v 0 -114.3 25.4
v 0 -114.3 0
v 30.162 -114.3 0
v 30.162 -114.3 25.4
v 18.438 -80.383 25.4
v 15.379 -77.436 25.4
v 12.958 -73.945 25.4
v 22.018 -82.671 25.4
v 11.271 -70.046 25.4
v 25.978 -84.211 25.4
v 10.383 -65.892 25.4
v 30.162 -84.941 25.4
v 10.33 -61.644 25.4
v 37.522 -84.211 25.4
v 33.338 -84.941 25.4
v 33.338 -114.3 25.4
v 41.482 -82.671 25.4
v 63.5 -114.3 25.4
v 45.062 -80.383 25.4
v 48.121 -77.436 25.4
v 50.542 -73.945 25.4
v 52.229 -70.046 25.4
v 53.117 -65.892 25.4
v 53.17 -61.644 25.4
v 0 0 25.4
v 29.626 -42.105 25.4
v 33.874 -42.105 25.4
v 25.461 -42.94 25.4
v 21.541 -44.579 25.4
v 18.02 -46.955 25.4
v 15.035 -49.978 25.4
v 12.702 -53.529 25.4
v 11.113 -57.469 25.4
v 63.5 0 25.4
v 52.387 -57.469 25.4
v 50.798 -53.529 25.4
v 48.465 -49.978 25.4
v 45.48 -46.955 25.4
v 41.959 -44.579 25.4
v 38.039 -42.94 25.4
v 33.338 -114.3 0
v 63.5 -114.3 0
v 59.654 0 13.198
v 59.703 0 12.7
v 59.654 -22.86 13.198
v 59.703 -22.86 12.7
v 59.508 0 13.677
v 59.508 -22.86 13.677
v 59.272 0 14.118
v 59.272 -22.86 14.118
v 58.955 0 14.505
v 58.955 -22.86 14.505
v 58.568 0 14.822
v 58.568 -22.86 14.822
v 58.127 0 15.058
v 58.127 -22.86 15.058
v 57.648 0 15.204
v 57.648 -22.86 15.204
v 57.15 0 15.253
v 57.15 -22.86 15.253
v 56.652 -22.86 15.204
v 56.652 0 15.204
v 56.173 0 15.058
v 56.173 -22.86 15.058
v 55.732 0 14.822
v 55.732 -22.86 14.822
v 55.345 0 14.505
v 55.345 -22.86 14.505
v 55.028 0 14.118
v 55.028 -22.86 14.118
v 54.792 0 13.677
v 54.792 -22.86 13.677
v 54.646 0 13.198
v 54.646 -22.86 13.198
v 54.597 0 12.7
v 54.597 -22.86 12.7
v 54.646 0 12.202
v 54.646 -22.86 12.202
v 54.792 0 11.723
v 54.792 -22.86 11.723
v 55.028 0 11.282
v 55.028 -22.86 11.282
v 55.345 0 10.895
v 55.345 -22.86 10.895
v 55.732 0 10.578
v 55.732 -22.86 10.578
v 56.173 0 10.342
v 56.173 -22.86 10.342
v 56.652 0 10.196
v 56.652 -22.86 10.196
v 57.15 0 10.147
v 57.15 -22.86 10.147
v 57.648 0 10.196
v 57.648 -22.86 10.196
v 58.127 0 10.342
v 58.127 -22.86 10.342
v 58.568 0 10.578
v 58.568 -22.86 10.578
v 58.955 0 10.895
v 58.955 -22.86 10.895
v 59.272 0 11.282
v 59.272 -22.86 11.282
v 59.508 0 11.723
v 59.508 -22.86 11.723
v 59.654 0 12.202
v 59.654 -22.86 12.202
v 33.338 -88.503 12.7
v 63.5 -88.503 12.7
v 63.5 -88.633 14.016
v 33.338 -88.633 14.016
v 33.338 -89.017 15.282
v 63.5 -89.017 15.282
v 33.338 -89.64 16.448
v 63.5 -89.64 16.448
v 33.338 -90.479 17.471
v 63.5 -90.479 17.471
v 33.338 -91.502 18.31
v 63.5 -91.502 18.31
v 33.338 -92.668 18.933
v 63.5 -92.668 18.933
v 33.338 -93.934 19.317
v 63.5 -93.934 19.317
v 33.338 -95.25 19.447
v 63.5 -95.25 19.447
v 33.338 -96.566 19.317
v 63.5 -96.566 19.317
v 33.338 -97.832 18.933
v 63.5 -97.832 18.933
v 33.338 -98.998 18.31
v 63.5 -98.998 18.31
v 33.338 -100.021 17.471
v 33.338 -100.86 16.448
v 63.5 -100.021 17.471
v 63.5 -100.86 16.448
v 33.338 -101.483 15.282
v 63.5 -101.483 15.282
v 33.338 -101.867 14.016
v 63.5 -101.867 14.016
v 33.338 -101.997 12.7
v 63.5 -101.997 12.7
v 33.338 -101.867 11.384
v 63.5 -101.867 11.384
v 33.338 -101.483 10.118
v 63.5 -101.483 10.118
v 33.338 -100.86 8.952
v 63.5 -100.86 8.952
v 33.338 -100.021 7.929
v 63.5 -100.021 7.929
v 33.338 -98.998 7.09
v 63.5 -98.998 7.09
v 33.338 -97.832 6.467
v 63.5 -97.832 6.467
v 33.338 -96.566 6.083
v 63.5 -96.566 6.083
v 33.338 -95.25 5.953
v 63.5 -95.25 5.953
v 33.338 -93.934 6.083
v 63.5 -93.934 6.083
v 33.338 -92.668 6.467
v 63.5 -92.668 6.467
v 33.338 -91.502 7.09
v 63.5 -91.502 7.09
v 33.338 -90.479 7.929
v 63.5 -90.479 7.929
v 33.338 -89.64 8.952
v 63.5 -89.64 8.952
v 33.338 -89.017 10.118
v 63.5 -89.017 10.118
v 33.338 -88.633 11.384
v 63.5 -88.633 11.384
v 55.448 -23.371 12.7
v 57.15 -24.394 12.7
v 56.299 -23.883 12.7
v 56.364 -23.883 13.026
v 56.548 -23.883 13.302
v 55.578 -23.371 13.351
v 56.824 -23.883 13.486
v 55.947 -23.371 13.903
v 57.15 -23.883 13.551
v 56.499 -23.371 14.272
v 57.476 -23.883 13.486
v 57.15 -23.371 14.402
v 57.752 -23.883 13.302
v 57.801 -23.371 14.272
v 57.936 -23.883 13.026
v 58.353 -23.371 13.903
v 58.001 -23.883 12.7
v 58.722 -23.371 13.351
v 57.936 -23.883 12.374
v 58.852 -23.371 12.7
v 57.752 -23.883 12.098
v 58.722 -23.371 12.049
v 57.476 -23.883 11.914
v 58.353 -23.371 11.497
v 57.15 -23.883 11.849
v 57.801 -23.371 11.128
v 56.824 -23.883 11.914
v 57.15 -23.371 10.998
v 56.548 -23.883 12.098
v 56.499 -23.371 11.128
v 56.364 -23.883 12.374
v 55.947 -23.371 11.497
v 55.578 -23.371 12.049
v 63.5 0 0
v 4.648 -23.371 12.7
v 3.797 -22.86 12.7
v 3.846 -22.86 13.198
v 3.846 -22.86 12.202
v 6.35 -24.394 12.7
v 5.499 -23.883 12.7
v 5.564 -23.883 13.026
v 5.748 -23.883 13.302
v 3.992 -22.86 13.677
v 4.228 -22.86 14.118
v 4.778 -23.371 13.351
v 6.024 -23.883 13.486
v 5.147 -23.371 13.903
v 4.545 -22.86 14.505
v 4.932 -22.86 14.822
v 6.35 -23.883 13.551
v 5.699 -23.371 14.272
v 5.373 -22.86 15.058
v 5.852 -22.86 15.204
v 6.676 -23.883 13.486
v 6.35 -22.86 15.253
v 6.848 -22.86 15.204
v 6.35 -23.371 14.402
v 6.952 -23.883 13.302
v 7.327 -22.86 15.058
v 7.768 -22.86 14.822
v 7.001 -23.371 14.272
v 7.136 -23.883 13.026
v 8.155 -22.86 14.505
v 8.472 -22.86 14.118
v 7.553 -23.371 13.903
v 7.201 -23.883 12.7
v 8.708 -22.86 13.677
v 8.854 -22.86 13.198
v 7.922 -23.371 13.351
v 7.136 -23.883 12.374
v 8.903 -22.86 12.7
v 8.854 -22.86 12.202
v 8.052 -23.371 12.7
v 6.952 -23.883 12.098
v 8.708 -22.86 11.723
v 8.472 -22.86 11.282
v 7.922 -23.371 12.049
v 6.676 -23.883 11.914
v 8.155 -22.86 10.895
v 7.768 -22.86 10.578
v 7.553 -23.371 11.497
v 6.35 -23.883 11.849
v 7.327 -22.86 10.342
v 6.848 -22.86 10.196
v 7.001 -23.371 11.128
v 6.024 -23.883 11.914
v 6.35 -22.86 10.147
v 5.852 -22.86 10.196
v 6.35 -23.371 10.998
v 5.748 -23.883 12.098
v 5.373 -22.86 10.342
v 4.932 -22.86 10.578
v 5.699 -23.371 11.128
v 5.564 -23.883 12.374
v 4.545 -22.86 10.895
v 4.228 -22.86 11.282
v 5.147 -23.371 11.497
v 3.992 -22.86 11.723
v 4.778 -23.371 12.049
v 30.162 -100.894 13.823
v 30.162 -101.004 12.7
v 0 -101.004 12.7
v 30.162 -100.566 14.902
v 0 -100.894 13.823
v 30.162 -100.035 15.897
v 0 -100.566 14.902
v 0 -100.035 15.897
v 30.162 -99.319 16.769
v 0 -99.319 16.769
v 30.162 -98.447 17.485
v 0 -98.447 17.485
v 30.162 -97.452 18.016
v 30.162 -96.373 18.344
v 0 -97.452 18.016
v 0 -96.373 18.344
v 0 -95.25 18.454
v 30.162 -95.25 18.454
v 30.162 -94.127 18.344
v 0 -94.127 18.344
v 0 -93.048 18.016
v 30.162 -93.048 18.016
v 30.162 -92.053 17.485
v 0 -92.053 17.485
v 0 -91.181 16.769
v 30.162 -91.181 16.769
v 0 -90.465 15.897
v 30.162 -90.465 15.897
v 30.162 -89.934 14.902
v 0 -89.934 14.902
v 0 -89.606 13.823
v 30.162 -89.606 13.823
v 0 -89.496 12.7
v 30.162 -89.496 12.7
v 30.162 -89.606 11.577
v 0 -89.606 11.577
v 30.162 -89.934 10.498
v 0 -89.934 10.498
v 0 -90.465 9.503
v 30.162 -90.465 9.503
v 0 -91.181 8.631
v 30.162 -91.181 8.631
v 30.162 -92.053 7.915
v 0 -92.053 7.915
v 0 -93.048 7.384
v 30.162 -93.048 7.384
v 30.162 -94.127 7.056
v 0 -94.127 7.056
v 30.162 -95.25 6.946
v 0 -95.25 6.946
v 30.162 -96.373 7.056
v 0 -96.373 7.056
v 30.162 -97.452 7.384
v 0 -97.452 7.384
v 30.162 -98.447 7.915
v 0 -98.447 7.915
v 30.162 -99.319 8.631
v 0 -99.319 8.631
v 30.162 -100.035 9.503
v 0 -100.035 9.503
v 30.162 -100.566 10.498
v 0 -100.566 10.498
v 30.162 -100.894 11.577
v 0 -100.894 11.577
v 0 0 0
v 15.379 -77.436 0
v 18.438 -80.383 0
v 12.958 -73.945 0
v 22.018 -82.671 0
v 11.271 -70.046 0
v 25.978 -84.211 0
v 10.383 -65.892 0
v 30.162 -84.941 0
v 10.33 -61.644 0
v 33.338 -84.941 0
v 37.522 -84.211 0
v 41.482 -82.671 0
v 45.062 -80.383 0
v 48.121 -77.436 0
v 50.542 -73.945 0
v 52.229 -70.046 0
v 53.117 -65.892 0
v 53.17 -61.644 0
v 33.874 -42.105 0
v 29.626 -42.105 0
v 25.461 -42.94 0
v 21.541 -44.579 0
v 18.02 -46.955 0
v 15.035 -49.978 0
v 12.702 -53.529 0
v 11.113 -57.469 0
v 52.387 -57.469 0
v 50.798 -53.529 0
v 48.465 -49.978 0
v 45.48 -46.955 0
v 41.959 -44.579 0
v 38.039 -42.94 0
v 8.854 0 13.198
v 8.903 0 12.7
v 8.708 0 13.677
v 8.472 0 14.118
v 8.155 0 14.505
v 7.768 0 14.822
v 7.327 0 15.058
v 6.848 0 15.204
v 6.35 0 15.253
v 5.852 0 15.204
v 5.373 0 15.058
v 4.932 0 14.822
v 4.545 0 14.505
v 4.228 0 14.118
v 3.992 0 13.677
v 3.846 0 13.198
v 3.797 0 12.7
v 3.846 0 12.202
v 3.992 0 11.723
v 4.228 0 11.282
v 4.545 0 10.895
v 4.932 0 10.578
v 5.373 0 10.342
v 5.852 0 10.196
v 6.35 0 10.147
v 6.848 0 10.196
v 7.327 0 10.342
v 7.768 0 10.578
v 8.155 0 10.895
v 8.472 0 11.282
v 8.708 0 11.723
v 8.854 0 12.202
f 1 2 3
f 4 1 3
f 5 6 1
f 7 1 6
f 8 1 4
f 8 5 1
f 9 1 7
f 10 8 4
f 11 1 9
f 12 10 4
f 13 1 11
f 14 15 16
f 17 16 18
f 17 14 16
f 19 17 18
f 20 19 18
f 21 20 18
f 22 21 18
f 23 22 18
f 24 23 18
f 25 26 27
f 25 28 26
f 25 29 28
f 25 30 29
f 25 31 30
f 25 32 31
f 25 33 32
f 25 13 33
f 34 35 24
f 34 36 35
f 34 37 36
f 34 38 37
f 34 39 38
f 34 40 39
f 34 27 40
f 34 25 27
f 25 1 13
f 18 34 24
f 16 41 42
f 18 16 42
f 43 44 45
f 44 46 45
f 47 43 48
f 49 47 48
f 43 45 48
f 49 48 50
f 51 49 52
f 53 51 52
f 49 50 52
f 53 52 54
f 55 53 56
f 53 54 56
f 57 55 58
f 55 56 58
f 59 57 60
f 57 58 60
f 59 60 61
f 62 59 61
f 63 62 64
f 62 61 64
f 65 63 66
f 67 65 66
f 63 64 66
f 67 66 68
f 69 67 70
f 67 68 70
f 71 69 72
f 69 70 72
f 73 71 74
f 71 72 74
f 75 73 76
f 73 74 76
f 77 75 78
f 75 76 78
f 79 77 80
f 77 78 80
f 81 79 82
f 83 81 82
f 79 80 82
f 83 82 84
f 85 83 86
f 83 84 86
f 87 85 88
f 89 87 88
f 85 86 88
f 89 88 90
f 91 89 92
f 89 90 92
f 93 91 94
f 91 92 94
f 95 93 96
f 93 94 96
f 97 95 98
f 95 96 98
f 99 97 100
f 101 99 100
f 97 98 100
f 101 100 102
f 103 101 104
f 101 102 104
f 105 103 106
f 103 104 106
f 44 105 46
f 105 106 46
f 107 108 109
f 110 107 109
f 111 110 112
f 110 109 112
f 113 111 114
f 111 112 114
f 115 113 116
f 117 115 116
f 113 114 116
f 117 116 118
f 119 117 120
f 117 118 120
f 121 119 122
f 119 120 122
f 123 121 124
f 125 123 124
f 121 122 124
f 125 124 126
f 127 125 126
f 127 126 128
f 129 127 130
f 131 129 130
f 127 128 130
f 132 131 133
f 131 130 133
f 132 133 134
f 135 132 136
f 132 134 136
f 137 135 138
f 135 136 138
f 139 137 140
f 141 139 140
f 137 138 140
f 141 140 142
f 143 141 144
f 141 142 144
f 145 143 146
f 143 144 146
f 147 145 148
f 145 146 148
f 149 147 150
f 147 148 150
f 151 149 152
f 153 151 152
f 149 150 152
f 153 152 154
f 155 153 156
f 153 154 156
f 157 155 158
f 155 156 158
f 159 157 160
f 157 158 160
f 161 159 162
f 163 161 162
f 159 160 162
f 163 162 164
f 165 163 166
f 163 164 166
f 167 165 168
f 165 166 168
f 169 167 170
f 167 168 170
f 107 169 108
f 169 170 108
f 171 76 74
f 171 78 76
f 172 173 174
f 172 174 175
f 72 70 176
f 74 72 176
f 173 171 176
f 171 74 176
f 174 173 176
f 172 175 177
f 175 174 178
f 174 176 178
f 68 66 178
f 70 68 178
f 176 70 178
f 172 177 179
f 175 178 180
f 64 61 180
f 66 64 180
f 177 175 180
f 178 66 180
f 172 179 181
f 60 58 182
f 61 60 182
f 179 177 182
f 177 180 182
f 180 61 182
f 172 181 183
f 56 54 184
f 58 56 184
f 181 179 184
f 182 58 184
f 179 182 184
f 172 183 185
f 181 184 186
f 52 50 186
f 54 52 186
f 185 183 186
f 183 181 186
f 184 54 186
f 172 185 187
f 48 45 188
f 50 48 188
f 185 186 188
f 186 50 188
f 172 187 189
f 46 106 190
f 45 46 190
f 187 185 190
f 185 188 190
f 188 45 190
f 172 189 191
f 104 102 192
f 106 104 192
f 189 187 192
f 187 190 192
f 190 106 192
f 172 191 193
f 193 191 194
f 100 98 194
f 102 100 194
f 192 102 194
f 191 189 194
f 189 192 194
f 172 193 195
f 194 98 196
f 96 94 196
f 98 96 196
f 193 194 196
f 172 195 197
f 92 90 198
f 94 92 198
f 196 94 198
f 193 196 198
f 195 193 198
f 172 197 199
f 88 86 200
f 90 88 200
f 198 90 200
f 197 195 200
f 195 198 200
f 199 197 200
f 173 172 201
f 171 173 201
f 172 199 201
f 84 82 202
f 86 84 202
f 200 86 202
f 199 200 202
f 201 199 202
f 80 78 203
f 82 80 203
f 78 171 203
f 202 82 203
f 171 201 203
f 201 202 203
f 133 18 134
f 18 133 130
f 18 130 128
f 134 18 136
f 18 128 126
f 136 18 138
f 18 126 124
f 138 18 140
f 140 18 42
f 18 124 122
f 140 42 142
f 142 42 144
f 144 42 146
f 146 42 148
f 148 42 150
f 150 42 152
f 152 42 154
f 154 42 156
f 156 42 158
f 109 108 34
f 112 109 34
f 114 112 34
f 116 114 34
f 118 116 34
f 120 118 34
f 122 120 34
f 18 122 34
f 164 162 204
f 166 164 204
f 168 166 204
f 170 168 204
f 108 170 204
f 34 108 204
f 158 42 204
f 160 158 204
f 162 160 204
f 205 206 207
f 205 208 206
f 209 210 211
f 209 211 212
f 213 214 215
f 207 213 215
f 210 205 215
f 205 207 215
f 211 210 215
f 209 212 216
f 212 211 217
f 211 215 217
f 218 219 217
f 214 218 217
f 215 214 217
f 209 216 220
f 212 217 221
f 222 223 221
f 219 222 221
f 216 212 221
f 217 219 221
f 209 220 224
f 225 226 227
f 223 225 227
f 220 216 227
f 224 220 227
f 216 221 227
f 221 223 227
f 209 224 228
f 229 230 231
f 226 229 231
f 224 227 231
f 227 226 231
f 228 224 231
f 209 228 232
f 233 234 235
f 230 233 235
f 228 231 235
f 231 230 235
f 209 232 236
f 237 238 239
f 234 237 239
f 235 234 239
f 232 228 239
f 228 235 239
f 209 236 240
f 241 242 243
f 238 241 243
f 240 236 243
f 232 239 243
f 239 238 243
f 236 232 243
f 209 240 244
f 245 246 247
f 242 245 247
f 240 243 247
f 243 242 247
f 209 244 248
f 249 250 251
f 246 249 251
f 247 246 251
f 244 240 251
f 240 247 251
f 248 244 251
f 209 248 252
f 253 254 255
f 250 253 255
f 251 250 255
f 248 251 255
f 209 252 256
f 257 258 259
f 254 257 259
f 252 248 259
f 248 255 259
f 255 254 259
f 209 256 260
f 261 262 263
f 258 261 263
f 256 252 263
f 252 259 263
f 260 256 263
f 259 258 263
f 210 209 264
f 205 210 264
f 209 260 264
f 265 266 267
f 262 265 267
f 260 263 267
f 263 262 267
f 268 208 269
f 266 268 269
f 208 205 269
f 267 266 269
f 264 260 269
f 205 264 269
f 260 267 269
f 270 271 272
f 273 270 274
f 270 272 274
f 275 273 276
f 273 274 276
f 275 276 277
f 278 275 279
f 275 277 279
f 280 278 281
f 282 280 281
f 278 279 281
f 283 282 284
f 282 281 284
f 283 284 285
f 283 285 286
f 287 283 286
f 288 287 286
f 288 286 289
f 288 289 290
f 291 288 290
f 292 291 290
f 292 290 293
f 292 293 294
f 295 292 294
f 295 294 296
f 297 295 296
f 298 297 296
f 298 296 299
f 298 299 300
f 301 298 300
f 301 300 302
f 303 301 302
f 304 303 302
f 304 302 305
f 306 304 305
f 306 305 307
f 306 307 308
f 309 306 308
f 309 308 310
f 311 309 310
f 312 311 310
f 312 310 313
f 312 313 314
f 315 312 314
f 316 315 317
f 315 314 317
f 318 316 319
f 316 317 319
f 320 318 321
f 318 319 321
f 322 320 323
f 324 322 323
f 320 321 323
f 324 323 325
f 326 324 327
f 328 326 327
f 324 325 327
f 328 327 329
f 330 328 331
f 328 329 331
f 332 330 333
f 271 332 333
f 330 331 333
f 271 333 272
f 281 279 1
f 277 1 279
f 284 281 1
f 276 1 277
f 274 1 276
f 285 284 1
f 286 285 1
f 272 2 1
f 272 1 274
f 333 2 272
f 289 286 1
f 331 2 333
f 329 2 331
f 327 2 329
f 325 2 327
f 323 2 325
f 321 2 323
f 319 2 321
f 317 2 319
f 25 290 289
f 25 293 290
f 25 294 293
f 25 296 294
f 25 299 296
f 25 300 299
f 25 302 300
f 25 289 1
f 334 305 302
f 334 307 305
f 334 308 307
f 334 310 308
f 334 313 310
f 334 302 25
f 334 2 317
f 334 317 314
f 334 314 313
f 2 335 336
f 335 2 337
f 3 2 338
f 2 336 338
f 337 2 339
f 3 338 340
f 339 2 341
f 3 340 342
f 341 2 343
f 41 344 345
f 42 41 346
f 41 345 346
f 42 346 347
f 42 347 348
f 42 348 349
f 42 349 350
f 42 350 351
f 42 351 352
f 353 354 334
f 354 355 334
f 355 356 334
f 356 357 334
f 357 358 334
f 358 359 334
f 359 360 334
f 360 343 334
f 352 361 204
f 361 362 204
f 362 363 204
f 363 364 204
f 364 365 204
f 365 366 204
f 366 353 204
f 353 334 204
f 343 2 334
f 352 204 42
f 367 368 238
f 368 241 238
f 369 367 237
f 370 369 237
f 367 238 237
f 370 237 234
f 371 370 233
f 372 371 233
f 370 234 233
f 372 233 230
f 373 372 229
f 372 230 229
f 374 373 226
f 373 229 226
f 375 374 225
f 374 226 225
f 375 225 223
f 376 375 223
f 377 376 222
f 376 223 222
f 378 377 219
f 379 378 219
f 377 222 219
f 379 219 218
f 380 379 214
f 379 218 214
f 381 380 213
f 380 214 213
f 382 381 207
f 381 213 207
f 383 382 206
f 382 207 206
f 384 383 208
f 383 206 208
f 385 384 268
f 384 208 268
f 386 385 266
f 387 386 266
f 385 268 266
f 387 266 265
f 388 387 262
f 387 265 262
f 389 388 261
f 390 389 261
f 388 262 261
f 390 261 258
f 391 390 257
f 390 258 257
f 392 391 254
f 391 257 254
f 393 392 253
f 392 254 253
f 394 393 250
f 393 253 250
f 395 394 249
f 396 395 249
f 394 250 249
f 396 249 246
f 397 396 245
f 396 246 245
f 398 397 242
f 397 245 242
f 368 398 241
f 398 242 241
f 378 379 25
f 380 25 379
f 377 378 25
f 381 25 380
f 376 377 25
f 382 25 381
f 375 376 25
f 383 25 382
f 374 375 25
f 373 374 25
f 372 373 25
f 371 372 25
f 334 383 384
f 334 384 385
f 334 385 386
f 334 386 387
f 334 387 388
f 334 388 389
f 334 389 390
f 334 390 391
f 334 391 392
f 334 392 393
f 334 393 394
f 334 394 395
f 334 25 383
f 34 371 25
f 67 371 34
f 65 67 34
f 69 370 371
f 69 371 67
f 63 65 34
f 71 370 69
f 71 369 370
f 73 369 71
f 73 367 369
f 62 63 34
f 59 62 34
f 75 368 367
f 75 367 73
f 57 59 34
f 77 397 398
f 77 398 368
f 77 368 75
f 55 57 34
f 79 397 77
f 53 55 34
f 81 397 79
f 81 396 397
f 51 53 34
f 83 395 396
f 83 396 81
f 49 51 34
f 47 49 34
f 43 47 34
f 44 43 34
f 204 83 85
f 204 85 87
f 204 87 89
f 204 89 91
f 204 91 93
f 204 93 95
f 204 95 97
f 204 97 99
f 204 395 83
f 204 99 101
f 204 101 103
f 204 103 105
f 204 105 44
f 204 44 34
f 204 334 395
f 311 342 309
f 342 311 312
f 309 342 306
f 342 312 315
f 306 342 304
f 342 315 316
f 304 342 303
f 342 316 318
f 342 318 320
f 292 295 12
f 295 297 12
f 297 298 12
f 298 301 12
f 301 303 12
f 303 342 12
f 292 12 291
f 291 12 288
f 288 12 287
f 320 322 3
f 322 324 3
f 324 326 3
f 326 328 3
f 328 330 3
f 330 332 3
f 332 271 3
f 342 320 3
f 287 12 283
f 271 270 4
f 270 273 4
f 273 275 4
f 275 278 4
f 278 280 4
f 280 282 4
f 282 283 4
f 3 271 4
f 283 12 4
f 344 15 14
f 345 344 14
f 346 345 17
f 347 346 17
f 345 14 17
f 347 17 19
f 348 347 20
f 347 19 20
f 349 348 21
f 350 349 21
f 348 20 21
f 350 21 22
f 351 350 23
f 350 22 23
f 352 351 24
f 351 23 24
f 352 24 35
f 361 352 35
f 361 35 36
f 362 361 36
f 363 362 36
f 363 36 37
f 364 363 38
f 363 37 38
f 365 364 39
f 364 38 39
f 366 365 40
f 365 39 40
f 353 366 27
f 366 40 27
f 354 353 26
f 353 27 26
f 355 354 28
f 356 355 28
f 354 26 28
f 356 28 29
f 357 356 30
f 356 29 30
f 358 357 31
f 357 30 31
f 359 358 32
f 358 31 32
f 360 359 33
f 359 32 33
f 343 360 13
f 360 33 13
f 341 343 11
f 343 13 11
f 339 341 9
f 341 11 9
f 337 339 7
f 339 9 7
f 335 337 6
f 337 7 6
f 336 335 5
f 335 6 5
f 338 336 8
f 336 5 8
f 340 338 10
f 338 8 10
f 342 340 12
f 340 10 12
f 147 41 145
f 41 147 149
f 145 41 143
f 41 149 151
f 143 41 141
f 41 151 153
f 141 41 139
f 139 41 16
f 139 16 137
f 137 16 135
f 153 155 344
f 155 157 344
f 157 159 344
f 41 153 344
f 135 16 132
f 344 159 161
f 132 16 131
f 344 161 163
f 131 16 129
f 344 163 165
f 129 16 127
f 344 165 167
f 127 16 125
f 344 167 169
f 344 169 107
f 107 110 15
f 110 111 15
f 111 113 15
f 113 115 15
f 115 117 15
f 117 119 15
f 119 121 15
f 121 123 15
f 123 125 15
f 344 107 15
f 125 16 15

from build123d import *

# Parameters (mm, degrees)
F0_W     = 63.5
F0_H     = 114.3
F1_DEPTH = 25.4
F3_D     = 5.1054
F3_DEPTH = 22.86
F3_TIP   = 1.5338169022
F5_DEPTH = 25.4
F6_R     = 6.746875
F7_DEPTH = 30.1625
F9_D     = 11.50874


with BuildPart() as f1:
    # F0 (on Top) → F1 (new body)
    with BuildSketch(Plane.XY):
        with Locations((31.75, -57.15)):
            Rectangle(F0_W, F0_H)
    extrude(amount=F1_DEPTH)

    # F3
    with Locations(Plane(origin=(0, 0, 0), x_dir=(-1, 0, 0), z_dir=(0, 1, 0))):
        with Locations((-57.15, 12.7), (-6.35, 12.7)):
            Hole(F3_D / 2, depth=F3_DEPTH)
            with Locations((0, 0, -(F3_DEPTH + F3_TIP / 2))):  # 118° drill point
                Cone(0, F3_D / 2, F3_TIP, mode=Mode.SUBTRACT)

    # F4 (on face) → F5 (cut, through all)
    with BuildSketch(Plane.XY.offset(25.4)):
        with BuildLine():
            Line((33.3375, -114.3), (33.3375, -84.9413116145))
            ThreePointArc((33.3375, -84.9413116145), (31.75, -42), (30.1625, -84.9413116145))
            Line((30.1625, -84.9413116145), (30.1625, -114.3))
            Line((30.1625, -114.3), (33.3375, -114.3))
        make_face()
    extrude(amount=-F5_DEPTH, mode=Mode.SUBTRACT)

    # F6 (on face) → F7 (cut, through all)
    with BuildSketch(Plane.YZ.offset(63.5)):
        with Locations((-95.25, 12.7)):
            Circle(F6_R)
    extrude(amount=-F7_DEPTH, mode=Mode.SUBTRACT)

    # F9 (through all)
    with Locations(Plane.YZ.offset(30.1625)):
        with Locations((-95.25, 12.7)):
            Hole(F9_D / 2)


solid = f1.part
